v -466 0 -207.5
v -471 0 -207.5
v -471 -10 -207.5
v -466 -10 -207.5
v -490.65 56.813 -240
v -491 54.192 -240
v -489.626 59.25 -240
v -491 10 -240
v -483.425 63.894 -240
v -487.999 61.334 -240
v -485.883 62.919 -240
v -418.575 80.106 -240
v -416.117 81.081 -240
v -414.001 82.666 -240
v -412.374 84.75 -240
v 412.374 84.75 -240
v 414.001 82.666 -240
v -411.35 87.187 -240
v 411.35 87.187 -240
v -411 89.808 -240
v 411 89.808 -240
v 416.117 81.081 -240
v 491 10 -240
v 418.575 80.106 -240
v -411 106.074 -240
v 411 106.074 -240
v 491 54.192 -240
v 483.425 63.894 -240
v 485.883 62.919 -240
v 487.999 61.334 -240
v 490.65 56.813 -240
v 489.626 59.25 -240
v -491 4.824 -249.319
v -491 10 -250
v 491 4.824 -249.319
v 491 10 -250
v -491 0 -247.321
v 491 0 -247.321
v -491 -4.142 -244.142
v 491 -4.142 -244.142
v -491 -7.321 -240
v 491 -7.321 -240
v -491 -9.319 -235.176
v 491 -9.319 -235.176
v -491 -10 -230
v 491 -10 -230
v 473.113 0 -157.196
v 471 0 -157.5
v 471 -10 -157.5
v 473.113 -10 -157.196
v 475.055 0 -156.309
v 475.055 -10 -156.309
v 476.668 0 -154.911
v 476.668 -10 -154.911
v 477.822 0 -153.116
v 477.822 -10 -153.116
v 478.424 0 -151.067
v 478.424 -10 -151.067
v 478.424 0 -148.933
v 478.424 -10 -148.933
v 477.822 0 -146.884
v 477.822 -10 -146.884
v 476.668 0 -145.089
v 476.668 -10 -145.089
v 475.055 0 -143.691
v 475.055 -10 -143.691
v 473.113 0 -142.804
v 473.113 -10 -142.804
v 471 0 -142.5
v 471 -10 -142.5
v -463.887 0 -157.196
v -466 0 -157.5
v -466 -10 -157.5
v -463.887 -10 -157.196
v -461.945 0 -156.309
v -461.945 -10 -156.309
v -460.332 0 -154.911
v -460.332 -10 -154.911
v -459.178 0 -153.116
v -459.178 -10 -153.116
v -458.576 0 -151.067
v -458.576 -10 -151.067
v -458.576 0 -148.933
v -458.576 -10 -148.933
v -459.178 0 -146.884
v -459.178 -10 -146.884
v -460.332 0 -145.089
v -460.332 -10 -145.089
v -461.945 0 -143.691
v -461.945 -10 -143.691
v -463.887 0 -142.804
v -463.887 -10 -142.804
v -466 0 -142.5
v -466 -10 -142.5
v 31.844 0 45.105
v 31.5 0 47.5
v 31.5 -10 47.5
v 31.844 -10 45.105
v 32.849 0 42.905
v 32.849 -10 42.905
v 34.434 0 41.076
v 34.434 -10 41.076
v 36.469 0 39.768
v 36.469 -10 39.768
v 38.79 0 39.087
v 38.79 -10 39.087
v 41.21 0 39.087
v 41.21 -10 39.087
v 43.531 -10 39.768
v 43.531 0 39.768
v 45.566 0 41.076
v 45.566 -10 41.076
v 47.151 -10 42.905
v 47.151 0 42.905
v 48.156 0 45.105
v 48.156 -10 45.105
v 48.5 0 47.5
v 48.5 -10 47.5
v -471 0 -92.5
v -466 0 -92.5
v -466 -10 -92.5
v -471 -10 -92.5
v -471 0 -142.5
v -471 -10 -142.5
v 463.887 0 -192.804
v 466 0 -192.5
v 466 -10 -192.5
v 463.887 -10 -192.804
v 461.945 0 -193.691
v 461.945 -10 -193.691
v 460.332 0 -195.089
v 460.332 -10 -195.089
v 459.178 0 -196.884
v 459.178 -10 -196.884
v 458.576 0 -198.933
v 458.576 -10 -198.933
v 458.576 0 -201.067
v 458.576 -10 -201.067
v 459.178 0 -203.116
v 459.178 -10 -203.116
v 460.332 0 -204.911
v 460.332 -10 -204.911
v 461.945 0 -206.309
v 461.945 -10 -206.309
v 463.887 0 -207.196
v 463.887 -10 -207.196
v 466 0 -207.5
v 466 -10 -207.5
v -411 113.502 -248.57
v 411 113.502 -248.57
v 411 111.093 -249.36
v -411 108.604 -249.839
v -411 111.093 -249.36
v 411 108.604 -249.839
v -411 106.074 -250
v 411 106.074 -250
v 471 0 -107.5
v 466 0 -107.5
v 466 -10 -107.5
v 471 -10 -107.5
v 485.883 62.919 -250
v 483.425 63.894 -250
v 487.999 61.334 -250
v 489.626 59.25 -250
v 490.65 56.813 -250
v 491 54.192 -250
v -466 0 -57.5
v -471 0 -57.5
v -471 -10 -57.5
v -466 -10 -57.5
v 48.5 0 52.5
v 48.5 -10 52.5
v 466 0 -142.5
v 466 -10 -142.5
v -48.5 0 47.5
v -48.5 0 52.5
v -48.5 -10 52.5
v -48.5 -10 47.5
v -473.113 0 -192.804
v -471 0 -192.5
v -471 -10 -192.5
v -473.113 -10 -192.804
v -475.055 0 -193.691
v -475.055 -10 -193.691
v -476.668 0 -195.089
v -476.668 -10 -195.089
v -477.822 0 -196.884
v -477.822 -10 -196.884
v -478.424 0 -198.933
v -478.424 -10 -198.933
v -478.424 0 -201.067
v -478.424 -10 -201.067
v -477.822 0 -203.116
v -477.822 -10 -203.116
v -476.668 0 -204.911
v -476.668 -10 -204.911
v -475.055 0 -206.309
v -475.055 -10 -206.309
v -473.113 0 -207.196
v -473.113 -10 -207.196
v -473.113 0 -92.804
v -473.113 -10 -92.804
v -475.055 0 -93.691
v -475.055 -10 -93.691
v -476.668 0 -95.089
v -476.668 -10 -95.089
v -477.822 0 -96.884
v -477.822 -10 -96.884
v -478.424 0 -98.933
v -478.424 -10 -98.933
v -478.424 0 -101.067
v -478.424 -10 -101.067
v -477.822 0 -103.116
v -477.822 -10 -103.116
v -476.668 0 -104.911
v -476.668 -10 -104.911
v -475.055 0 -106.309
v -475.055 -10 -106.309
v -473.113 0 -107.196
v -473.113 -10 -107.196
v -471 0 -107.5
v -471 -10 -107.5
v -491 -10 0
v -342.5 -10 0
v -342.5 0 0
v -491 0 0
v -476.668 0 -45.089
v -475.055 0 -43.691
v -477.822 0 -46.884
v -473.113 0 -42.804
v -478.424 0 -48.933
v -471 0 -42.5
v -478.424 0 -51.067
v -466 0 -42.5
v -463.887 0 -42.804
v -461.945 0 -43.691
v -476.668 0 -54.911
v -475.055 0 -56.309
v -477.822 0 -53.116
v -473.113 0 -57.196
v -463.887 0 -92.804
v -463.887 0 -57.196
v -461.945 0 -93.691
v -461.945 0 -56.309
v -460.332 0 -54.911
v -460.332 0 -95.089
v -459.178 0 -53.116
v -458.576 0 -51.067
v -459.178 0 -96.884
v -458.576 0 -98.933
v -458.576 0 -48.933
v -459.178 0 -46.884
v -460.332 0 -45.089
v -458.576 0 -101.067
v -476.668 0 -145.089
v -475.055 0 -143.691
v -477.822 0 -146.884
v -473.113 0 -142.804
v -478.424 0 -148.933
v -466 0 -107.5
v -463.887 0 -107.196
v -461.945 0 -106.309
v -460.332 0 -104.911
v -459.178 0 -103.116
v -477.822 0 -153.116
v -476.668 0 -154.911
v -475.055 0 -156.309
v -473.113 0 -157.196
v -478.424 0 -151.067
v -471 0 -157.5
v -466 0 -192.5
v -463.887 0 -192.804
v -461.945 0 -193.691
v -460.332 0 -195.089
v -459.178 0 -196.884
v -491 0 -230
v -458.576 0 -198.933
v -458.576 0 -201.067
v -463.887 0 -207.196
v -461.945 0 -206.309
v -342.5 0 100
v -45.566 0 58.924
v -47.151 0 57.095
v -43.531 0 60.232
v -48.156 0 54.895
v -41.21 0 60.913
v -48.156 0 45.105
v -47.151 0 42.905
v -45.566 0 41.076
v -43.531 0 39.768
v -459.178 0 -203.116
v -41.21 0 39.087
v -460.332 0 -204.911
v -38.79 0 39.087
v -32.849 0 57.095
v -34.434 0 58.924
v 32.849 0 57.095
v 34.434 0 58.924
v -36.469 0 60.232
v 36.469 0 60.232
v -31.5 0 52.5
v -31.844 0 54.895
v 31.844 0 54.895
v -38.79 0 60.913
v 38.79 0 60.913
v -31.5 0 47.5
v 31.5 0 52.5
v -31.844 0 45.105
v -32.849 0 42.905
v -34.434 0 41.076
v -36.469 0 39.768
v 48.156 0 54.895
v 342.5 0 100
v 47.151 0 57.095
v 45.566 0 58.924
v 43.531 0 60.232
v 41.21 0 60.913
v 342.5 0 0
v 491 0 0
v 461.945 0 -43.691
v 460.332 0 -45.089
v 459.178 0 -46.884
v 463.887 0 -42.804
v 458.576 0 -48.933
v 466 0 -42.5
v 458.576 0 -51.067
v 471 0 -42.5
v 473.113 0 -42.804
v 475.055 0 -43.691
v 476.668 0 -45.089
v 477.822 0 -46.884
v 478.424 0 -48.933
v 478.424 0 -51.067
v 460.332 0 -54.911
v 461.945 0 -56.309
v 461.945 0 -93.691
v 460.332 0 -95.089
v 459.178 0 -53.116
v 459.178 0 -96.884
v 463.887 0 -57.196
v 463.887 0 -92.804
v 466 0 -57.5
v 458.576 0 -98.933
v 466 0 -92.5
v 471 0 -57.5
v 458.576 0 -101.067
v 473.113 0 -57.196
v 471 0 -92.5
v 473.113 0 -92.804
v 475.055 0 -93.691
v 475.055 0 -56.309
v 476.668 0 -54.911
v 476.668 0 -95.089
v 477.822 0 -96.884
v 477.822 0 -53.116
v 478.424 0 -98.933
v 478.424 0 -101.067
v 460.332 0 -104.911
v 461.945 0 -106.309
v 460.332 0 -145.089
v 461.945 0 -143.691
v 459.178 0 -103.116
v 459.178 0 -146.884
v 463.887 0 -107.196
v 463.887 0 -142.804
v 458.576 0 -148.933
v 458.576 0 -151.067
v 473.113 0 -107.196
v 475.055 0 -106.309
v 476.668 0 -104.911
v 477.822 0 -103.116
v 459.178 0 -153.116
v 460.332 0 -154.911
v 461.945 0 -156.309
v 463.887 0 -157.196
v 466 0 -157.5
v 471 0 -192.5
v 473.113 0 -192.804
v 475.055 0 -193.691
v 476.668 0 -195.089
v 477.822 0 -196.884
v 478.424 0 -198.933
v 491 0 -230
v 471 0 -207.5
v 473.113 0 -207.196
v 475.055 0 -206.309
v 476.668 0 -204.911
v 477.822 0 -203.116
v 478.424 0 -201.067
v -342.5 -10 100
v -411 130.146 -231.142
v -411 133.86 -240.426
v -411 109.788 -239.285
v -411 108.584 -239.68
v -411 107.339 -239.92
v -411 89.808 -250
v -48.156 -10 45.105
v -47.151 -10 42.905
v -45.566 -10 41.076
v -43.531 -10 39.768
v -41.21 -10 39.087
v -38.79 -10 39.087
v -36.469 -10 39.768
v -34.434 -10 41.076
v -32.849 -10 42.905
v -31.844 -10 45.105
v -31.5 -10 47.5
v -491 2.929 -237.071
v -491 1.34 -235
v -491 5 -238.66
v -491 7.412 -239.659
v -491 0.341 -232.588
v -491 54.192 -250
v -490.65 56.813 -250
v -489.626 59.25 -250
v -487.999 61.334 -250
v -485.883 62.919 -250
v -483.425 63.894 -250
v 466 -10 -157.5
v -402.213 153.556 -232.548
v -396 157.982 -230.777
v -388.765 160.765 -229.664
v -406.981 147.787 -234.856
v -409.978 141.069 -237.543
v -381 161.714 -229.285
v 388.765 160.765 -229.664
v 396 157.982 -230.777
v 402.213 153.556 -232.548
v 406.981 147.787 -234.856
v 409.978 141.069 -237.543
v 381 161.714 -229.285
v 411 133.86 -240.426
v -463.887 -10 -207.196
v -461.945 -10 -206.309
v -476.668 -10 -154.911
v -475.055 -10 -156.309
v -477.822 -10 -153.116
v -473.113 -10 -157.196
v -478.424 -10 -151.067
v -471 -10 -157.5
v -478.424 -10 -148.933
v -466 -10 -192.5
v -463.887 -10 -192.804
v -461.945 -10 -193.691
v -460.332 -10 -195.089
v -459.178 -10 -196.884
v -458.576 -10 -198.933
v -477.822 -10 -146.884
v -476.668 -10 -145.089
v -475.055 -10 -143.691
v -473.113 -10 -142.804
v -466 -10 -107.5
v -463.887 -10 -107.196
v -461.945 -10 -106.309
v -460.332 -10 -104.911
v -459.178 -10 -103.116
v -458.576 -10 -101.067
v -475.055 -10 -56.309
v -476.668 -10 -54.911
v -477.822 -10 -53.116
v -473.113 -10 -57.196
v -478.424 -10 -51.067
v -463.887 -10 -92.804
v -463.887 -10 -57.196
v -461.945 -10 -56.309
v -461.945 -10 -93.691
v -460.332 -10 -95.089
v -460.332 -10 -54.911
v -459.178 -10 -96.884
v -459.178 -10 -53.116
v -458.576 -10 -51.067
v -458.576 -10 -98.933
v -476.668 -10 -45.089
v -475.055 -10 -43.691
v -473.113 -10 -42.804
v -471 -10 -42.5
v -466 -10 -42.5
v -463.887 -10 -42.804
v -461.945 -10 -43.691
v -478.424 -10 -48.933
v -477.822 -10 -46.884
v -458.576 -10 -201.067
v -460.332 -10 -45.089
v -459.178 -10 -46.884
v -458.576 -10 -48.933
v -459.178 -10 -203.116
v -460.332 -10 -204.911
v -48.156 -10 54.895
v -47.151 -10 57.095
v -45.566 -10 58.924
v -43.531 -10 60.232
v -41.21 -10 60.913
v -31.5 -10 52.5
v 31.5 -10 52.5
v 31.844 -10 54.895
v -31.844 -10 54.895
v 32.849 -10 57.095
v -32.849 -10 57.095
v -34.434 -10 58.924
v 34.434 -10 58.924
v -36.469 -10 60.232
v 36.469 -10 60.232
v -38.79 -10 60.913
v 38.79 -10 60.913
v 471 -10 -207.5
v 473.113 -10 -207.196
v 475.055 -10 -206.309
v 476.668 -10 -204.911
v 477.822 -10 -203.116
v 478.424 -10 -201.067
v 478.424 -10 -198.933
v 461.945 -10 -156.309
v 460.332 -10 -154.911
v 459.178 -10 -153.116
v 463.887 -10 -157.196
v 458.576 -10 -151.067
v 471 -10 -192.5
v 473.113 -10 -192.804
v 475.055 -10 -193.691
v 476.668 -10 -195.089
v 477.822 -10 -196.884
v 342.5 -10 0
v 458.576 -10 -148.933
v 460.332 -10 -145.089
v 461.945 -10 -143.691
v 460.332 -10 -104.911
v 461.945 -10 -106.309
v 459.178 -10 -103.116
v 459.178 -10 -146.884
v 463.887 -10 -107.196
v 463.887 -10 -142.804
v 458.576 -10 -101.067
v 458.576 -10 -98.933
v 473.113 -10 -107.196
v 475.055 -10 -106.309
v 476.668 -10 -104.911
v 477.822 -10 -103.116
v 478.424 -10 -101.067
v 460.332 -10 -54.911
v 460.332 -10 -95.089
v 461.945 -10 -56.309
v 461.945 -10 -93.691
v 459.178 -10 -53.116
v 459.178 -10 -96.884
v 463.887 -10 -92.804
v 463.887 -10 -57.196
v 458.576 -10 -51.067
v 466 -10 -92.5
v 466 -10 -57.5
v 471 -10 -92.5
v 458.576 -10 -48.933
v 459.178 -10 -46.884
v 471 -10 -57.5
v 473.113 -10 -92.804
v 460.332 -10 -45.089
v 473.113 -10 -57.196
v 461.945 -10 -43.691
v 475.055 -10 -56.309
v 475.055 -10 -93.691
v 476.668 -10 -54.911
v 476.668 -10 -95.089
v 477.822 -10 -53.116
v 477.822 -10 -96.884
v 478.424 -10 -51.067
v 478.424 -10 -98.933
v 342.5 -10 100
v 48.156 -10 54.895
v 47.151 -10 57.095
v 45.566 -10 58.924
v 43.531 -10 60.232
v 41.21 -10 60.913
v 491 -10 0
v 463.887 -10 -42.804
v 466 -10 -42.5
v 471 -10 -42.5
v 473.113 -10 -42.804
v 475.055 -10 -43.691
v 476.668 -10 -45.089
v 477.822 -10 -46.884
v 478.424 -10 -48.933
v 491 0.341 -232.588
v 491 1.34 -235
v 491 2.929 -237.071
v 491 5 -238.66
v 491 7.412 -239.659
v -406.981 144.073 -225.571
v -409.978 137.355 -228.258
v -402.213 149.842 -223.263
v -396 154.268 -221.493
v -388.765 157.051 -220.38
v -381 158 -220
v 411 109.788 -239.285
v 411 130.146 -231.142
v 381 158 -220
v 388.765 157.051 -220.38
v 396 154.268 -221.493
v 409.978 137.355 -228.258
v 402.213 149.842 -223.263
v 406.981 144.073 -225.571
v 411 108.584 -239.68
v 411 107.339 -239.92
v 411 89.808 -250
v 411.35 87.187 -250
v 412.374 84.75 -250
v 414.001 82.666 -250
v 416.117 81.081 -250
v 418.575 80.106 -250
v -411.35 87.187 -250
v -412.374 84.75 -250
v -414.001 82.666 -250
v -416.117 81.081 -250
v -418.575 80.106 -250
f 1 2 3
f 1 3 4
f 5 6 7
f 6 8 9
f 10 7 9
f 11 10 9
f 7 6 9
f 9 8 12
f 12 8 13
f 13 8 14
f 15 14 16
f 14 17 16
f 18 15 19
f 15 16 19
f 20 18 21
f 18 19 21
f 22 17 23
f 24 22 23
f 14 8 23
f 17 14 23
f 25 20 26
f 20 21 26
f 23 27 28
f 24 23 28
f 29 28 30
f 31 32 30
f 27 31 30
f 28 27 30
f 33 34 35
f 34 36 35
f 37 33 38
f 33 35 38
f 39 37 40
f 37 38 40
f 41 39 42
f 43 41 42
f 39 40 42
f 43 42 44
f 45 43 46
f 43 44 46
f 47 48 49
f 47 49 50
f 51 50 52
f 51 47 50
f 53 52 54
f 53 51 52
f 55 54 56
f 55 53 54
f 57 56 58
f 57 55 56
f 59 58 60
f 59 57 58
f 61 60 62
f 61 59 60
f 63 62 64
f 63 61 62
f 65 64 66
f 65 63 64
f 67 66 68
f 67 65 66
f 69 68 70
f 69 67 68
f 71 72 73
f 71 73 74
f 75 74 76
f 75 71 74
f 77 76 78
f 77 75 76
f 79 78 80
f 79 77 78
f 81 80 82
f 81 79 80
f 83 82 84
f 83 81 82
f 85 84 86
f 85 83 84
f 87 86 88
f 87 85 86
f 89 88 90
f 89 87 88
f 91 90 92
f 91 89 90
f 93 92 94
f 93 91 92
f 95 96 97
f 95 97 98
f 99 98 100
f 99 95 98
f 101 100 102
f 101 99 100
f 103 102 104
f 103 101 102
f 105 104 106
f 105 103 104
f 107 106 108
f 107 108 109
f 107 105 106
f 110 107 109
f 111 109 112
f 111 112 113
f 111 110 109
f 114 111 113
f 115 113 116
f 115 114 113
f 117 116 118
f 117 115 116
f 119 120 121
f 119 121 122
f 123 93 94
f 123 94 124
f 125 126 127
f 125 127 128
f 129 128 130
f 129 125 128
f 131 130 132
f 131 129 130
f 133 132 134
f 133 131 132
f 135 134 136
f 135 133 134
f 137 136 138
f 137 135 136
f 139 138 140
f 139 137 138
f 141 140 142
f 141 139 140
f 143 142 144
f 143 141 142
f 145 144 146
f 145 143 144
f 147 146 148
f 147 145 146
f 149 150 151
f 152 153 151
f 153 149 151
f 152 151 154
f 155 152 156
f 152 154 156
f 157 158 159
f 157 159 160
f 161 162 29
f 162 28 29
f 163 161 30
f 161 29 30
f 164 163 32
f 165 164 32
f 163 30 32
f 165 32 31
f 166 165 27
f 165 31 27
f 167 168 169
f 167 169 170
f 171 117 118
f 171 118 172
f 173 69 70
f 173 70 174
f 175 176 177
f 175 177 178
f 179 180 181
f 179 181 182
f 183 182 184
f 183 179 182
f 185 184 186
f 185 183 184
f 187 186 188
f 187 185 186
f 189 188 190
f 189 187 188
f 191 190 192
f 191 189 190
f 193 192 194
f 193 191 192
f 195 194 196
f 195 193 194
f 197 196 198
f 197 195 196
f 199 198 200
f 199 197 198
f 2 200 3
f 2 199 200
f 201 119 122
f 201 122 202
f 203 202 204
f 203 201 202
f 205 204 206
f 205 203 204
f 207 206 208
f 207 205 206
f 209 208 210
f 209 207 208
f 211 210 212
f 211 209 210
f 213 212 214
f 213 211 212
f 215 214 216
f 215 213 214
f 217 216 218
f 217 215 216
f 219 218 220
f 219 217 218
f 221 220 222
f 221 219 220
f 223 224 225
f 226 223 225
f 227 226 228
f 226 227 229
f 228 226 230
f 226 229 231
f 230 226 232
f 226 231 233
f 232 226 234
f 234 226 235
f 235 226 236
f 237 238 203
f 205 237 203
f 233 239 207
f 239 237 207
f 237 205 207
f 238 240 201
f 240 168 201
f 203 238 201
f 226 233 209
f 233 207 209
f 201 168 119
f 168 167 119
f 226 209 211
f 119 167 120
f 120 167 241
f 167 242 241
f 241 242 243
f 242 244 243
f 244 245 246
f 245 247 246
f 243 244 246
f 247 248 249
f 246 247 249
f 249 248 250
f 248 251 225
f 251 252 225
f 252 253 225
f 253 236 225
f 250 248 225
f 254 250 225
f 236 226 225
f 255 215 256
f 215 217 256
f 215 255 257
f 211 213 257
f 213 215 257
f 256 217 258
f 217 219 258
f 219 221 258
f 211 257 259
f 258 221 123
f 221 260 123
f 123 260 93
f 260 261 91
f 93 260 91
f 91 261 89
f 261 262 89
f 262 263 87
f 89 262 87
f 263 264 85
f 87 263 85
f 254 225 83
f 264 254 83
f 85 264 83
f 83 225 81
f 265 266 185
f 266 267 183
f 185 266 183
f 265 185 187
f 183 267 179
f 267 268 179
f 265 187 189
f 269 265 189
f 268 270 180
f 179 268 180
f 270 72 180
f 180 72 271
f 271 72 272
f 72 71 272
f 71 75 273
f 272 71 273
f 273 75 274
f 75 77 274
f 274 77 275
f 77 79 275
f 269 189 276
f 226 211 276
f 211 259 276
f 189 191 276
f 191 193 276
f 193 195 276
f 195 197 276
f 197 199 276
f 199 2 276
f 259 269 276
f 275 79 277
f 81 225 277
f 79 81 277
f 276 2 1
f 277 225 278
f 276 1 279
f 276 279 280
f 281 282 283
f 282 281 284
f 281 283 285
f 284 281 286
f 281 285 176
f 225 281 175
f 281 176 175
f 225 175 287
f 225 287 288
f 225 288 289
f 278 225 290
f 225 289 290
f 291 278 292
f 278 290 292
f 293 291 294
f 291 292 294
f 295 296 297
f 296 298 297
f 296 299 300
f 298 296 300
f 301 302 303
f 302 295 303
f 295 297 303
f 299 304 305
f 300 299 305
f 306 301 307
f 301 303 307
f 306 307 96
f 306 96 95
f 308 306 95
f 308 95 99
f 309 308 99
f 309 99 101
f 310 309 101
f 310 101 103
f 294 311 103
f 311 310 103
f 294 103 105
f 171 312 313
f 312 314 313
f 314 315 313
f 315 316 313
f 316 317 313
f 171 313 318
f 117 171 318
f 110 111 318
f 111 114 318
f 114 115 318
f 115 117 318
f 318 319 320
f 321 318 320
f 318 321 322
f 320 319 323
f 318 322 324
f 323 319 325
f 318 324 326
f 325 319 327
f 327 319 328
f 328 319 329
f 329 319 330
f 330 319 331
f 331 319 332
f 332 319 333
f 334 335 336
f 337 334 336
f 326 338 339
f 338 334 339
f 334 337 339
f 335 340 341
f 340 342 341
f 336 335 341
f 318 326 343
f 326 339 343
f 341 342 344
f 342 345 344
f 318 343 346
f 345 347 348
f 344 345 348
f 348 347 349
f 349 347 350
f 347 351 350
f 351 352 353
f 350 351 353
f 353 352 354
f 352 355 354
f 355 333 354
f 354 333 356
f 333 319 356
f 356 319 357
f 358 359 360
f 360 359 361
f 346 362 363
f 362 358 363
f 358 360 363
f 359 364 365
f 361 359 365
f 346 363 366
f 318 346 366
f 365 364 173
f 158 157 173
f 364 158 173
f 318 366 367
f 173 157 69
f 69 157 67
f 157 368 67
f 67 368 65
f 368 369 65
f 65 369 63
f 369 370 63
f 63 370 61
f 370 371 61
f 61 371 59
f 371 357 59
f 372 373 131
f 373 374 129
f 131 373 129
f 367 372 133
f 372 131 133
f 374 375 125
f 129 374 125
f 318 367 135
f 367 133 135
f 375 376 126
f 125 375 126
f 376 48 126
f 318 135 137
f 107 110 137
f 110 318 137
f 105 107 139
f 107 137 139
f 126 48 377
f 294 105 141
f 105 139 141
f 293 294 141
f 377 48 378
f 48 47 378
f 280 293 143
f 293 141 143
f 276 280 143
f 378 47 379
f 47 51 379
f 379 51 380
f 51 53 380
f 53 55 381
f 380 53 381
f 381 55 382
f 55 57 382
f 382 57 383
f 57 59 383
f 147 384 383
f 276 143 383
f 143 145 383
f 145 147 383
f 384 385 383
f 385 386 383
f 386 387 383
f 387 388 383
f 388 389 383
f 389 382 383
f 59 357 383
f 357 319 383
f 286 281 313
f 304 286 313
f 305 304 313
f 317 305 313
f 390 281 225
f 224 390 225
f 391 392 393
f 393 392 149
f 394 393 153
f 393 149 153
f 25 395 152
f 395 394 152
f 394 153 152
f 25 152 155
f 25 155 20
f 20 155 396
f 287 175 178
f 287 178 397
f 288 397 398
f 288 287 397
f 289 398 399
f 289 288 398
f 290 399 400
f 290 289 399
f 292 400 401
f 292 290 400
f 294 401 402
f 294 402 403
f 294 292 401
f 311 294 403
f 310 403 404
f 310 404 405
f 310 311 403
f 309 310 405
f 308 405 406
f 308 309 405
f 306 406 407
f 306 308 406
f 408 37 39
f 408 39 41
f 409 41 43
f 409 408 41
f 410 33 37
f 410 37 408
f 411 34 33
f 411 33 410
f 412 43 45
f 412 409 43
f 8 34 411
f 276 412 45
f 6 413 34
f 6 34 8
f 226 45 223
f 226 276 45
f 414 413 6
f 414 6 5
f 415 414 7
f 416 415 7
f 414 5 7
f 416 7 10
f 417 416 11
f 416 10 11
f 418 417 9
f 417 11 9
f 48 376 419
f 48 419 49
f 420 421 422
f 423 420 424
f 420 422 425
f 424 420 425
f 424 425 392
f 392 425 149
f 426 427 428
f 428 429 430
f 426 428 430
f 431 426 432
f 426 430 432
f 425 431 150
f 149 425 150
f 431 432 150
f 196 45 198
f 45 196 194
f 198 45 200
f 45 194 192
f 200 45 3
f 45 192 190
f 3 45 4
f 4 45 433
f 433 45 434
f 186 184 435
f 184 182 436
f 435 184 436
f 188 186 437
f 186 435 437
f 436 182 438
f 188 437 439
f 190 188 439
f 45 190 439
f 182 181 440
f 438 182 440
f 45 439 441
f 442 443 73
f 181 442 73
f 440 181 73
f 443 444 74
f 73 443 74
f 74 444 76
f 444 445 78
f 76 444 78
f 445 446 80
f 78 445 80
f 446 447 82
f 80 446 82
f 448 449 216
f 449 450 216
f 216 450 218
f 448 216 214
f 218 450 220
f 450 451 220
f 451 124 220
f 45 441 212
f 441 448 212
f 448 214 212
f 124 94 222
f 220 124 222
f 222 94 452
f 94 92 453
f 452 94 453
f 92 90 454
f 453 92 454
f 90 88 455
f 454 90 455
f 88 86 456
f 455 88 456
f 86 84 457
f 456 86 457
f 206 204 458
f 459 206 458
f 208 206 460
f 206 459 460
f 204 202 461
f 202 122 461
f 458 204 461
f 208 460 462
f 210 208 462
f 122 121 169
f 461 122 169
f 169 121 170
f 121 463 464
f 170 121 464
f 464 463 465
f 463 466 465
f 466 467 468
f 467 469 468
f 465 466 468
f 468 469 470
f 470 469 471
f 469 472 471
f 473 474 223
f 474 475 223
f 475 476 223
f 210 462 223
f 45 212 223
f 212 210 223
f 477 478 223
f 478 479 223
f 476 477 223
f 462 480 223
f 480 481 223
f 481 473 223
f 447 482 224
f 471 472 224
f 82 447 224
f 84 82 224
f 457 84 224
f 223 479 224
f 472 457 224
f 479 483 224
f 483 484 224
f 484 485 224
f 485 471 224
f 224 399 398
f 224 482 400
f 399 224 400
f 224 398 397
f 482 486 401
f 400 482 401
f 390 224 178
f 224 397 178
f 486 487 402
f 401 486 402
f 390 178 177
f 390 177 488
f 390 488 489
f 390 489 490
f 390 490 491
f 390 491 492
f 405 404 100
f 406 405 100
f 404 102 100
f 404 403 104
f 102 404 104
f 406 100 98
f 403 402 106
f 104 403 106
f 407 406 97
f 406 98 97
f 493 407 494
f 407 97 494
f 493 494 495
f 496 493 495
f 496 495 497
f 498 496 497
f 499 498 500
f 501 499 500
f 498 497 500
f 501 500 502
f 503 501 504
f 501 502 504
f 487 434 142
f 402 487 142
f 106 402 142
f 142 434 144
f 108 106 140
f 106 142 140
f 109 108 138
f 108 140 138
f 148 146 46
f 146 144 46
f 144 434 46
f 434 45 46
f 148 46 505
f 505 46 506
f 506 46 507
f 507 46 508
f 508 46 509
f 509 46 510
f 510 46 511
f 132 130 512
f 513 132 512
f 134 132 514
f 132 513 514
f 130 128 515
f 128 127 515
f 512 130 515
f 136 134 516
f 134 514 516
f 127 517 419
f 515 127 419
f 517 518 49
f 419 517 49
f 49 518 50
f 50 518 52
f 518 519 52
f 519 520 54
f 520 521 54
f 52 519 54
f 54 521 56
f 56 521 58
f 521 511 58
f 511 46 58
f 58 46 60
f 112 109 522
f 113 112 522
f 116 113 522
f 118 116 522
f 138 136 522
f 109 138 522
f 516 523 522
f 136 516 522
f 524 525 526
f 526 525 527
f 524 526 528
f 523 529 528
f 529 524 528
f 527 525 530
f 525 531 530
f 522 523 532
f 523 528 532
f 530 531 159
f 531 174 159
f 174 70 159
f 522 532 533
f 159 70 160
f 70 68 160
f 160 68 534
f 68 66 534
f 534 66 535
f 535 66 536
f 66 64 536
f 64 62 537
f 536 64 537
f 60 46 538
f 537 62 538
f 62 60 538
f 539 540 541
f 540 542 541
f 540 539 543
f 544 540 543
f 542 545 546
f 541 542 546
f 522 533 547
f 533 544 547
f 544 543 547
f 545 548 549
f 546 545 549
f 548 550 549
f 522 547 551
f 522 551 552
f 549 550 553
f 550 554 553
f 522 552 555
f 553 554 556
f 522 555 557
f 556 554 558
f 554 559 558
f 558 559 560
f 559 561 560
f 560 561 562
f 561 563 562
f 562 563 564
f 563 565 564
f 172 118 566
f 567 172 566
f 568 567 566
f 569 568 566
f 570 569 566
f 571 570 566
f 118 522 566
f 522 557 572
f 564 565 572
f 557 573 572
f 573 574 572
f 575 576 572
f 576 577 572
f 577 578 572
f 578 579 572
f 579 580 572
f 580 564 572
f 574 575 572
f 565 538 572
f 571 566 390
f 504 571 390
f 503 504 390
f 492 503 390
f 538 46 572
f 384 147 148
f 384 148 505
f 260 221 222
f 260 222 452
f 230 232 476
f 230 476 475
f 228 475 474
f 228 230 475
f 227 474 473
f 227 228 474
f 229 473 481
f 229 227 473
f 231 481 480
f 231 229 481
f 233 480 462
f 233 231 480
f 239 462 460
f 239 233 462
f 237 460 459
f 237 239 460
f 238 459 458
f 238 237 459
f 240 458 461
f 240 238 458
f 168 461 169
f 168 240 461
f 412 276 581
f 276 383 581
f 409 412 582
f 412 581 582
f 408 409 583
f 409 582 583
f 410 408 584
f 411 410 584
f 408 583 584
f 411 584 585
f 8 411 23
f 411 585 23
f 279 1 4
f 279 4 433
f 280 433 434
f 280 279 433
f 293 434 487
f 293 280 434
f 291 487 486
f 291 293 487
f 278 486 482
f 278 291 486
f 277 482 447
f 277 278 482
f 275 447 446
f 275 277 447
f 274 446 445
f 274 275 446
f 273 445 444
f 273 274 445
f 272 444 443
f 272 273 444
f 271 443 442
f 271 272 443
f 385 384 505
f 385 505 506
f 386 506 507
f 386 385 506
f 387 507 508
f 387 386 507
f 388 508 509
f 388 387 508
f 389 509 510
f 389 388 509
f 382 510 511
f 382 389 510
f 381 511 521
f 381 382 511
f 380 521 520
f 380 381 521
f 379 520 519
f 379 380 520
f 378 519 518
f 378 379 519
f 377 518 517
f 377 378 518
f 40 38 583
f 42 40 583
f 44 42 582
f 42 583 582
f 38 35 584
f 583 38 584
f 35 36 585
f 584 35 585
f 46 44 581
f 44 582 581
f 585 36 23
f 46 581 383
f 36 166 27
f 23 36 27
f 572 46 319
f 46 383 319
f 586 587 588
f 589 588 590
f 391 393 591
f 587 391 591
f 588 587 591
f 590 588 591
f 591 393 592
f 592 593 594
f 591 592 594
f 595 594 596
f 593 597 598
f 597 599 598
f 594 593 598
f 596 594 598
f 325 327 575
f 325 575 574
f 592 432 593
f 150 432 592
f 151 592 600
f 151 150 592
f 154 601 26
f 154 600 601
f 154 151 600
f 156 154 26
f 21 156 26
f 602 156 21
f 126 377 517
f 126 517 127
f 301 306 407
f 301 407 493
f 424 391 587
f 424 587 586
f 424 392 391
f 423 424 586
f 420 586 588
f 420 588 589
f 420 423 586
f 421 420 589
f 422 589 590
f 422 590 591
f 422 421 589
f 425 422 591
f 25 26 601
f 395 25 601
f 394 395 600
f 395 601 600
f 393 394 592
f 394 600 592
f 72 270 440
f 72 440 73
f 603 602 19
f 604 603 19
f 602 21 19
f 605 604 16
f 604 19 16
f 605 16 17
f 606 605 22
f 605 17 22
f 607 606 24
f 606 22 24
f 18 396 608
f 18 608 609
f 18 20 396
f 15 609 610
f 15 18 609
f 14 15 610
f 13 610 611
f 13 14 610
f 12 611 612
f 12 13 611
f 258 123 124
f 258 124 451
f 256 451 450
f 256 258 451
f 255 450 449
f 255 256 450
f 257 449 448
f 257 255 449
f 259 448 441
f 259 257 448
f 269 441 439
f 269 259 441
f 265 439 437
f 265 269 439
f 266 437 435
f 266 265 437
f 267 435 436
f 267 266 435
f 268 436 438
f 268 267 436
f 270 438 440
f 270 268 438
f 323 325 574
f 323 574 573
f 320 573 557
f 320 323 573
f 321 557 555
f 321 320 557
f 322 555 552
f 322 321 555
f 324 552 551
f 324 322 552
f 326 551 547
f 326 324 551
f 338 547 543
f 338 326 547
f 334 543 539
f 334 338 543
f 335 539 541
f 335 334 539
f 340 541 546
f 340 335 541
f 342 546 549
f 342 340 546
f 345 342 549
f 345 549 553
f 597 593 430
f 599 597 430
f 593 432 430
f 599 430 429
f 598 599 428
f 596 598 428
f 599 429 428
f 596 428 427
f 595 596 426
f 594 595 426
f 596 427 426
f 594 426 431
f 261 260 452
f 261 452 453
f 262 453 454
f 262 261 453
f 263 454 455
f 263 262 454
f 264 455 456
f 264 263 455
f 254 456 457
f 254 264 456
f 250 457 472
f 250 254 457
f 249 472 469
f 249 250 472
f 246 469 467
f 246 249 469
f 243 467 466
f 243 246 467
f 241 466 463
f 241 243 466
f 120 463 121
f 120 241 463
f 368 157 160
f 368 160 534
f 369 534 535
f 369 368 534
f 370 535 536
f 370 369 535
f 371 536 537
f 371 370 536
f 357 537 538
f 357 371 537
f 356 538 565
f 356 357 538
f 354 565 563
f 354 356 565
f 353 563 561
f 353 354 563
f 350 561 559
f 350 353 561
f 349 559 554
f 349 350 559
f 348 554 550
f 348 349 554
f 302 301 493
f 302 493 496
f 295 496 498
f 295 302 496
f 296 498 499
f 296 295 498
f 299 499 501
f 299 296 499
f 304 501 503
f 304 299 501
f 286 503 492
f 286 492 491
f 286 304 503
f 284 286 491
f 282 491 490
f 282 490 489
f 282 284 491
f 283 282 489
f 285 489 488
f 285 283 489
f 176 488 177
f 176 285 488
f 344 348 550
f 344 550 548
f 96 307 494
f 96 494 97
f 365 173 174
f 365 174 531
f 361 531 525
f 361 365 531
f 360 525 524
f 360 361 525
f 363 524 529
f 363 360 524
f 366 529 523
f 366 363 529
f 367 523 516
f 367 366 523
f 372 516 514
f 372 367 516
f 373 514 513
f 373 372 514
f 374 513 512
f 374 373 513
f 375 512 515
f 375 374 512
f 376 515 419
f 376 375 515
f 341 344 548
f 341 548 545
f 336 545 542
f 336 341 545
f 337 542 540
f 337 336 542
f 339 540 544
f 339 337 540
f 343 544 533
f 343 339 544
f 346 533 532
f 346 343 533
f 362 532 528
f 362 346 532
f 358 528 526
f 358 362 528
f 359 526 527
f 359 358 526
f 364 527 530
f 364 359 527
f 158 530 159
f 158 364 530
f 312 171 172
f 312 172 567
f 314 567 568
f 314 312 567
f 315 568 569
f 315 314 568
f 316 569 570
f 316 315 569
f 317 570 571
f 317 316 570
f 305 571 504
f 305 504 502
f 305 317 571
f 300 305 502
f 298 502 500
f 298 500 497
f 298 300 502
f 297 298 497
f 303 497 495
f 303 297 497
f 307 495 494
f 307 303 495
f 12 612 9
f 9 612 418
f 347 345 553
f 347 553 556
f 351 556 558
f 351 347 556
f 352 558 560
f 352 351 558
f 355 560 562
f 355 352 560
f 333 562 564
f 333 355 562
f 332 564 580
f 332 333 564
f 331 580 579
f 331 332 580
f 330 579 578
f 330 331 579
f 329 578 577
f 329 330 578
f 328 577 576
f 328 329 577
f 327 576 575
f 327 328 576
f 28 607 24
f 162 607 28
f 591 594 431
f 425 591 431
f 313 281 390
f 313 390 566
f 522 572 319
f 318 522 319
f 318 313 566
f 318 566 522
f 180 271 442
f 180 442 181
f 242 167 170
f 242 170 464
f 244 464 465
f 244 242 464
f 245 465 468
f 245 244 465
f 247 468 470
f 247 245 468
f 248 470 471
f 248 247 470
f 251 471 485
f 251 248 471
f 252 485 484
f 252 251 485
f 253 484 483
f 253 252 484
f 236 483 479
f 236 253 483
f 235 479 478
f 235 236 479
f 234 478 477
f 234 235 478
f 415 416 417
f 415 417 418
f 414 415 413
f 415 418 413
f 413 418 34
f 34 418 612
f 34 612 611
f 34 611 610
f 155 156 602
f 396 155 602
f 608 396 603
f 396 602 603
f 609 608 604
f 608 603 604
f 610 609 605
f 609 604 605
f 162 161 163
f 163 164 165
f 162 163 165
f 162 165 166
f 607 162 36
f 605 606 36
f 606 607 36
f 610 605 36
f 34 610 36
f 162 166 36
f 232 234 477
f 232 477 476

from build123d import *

# Parameters (mm, degrees)
SM_BASE_FLANGE_1_DEPTH = 491
CUT_EXTRUDE_1_REACH    = 576.223
CUT_EXTRUDE_2_DEPTH    = 575.223290751
PATTERN_LINEAR_1_COUNT = 4
PATTERN_LINEAR_1_PITCH = 50
FILLET_1_R             = 30
SKETCH_4_W             = 685
SKETCH_4_H             = 100
EXTRUDE_1_DEPTH        = 10
CUT_EXTRUDE_3_DEPTH    = 10
FILLET_2_R             = 10


# Sheet-metal steps are written as plain solids
with BuildPart() as part:
    # Sketch 1 → 基体-法兰1 (new, symmetric)
    with BuildSketch(Plane(origin=(0, 0, 0), x_dir=(0, 0, -1), z_dir=(1, 0, 0))):
        with BuildLine():
            Line((0, 0), (230, 0))
            ThreePointArc((230, 0), (237.071067812, 2.928932188), (240, 10))
            Line((240, 10), (240, 106.074175964))
            ThreePointArc((240, 106.074175964), (239.819563867, 107.965251176), (239.284766909, 109.788082728))
            Line((239.284766909, 109.788082728), (220, 158))
            Line((220, 158), (229.284766909, 161.713906764))
            Line((229.284766909, 161.713906764), (248.569533818, 113.501989491))
            ThreePointArc((248.569533818, 113.501989491), (249.639127735, 109.856326387), (250, 106.074175964))
            Line((250, 106.074175964), (250, 10))
            ThreePointArc((250, 10), (244.142135624, -4.142135624), (230, -10))
            Line((230, -10), (0, -10))
            Line((0, -10), (0, 0))
        make_face()
    extrude(amount=SM_BASE_FLANGE_1_DEPTH, both=True)

    # Sketch 2 → 切除-拉伸1 (cut, up to next)
    with BuildSketch(Plane(origin=(0, 0, -250), x_dir=(-1, 0, 0), z_dir=(0, 0, -1)), mode=Mode.PRIVATE) as cut_extrude_1_sk1:
        Polygon((-411, 161.713906764), (-411, 82), (-491, 62), (-491, 161.713906764), align=None)
    cut_extrude_1_tool1 = extrude(cut_extrude_1_sk1.sketch, amount=-CUT_EXTRUDE_1_REACH, mode=Mode.PRIVATE) & part.part
    # Sketch 2 → 切除-拉伸1 (cut, up to next)
    with BuildSketch(Plane(origin=(0, 0, -250), x_dir=(-1, 0, 0), z_dir=(0, 0, -1)), mode=Mode.PRIVATE) as cut_extrude_1_sk2:
        Polygon((491, 161.713906764), (411, 161.713906764), (411, 82), (491, 62), align=None)
    cut_extrude_1_tool2 = extrude(cut_extrude_1_sk2.sketch, amount=-CUT_EXTRUDE_1_REACH, mode=Mode.PRIVATE) & part.part
    add(cut_extrude_1_tool1.solids().sort_by_distance((452.486206, 116.671178, -250))[0], mode=Mode.SUBTRACT)
    add(cut_extrude_1_tool2.solids().sort_by_distance((-452.486206, 116.671178, -250))[0], mode=Mode.SUBTRACT)

    # 草图3 → 切除-拉伸2 (cut, through all)
    with BuildSketch(Plane(origin=(0, 0, 0), x_dir=(1, 0, 0), z_dir=(0, 1, 0))):
        with BuildLine():
            Line((466, 57.5), (471, 57.5))
            ThreePointArc((471, 57.5), (478.5, 50), (471, 42.5))
            Line((471, 42.5), (466, 42.5))
            ThreePointArc((466, 42.5), (458.5, 50), (466, 57.5))
        make_face()
        with BuildLine():
            Line((-466, 42.5), (-471, 42.5))
            ThreePointArc((-471, 42.5), (-478.5, 50), (-471, 57.5))
            Line((-471, 57.5), (-466, 57.5))
            ThreePointArc((-466, 57.5), (-458.5, 50), (-466, 42.5))
        make_face()
    cut_extrude_2 = extrude(amount=-CUT_EXTRUDE_2_DEPTH, mode=Mode.SUBTRACT)

    # 阵列(线性)1: 切除-拉伸2 ×4
    with Locations(*[(0, 0, -i * PATTERN_LINEAR_1_PITCH) for i in range(1, PATTERN_LINEAR_1_COUNT)]):
        add(cut_extrude_2, mode=Mode.SUBTRACT)

    # 圆角1
    fillet_1_edges = [part.edges().sort_by_distance(p)[0] for p in [
        (411, 159.856953382, -224.642383454),
        (-411, 159.856953382, -224.642383454),
    ]]
    fillet(fillet_1_edges, radius=FILLET_1_R)

    # 草图4 → 凸台-拉伸1 (add)
    with BuildSketch(Plane(origin=(0, 0, 0), x_dir=(1, 0, 0), z_dir=(0, 1, 0))):
        with Locations((0, -50)):
            Rectangle(SKETCH_4_W, SKETCH_4_H)
    extrude(amount=-EXTRUDE_1_DEPTH)

    # 草图5 → 切除-拉伸3 (cut)
    with BuildSketch(Plane(origin=(0, 0, 0), x_dir=(1, 0, 0), z_dir=(0, 1, 0))):
        with BuildLine():
            Line((-31.5, -47.5), (-31.5, -52.5))
            ThreePointArc((-31.5, -52.5), (-40, -61), (-48.5, -52.5))
            Line((-48.5, -52.5), (-48.5, -47.5))
            ThreePointArc((-48.5, -47.5), (-40, -39), (-31.5, -47.5))
        make_face()
        with BuildLine():
            Line((48.5, -47.5), (48.5, -52.5))
            ThreePointArc((48.5, -52.5), (40, -61), (31.5, -52.5))
            Line((31.5, -52.5), (31.5, -47.5))
            ThreePointArc((31.5, -47.5), (40, -39), (48.5, -47.5))
        make_face()
    extrude(amount=-CUT_EXTRUDE_3_DEPTH, mode=Mode.SUBTRACT)

    # 圆角2
    fillet_2_edges = [part.edges().sort_by_distance(p)[0] for p in [
        (491, 62, -245),
        (411, 82, -245),
        (-411, 82, -245),
        (-491, 62, -245),
    ]]
    fillet(fillet_2_edges, radius=FILLET_2_R)


solid = part.part
